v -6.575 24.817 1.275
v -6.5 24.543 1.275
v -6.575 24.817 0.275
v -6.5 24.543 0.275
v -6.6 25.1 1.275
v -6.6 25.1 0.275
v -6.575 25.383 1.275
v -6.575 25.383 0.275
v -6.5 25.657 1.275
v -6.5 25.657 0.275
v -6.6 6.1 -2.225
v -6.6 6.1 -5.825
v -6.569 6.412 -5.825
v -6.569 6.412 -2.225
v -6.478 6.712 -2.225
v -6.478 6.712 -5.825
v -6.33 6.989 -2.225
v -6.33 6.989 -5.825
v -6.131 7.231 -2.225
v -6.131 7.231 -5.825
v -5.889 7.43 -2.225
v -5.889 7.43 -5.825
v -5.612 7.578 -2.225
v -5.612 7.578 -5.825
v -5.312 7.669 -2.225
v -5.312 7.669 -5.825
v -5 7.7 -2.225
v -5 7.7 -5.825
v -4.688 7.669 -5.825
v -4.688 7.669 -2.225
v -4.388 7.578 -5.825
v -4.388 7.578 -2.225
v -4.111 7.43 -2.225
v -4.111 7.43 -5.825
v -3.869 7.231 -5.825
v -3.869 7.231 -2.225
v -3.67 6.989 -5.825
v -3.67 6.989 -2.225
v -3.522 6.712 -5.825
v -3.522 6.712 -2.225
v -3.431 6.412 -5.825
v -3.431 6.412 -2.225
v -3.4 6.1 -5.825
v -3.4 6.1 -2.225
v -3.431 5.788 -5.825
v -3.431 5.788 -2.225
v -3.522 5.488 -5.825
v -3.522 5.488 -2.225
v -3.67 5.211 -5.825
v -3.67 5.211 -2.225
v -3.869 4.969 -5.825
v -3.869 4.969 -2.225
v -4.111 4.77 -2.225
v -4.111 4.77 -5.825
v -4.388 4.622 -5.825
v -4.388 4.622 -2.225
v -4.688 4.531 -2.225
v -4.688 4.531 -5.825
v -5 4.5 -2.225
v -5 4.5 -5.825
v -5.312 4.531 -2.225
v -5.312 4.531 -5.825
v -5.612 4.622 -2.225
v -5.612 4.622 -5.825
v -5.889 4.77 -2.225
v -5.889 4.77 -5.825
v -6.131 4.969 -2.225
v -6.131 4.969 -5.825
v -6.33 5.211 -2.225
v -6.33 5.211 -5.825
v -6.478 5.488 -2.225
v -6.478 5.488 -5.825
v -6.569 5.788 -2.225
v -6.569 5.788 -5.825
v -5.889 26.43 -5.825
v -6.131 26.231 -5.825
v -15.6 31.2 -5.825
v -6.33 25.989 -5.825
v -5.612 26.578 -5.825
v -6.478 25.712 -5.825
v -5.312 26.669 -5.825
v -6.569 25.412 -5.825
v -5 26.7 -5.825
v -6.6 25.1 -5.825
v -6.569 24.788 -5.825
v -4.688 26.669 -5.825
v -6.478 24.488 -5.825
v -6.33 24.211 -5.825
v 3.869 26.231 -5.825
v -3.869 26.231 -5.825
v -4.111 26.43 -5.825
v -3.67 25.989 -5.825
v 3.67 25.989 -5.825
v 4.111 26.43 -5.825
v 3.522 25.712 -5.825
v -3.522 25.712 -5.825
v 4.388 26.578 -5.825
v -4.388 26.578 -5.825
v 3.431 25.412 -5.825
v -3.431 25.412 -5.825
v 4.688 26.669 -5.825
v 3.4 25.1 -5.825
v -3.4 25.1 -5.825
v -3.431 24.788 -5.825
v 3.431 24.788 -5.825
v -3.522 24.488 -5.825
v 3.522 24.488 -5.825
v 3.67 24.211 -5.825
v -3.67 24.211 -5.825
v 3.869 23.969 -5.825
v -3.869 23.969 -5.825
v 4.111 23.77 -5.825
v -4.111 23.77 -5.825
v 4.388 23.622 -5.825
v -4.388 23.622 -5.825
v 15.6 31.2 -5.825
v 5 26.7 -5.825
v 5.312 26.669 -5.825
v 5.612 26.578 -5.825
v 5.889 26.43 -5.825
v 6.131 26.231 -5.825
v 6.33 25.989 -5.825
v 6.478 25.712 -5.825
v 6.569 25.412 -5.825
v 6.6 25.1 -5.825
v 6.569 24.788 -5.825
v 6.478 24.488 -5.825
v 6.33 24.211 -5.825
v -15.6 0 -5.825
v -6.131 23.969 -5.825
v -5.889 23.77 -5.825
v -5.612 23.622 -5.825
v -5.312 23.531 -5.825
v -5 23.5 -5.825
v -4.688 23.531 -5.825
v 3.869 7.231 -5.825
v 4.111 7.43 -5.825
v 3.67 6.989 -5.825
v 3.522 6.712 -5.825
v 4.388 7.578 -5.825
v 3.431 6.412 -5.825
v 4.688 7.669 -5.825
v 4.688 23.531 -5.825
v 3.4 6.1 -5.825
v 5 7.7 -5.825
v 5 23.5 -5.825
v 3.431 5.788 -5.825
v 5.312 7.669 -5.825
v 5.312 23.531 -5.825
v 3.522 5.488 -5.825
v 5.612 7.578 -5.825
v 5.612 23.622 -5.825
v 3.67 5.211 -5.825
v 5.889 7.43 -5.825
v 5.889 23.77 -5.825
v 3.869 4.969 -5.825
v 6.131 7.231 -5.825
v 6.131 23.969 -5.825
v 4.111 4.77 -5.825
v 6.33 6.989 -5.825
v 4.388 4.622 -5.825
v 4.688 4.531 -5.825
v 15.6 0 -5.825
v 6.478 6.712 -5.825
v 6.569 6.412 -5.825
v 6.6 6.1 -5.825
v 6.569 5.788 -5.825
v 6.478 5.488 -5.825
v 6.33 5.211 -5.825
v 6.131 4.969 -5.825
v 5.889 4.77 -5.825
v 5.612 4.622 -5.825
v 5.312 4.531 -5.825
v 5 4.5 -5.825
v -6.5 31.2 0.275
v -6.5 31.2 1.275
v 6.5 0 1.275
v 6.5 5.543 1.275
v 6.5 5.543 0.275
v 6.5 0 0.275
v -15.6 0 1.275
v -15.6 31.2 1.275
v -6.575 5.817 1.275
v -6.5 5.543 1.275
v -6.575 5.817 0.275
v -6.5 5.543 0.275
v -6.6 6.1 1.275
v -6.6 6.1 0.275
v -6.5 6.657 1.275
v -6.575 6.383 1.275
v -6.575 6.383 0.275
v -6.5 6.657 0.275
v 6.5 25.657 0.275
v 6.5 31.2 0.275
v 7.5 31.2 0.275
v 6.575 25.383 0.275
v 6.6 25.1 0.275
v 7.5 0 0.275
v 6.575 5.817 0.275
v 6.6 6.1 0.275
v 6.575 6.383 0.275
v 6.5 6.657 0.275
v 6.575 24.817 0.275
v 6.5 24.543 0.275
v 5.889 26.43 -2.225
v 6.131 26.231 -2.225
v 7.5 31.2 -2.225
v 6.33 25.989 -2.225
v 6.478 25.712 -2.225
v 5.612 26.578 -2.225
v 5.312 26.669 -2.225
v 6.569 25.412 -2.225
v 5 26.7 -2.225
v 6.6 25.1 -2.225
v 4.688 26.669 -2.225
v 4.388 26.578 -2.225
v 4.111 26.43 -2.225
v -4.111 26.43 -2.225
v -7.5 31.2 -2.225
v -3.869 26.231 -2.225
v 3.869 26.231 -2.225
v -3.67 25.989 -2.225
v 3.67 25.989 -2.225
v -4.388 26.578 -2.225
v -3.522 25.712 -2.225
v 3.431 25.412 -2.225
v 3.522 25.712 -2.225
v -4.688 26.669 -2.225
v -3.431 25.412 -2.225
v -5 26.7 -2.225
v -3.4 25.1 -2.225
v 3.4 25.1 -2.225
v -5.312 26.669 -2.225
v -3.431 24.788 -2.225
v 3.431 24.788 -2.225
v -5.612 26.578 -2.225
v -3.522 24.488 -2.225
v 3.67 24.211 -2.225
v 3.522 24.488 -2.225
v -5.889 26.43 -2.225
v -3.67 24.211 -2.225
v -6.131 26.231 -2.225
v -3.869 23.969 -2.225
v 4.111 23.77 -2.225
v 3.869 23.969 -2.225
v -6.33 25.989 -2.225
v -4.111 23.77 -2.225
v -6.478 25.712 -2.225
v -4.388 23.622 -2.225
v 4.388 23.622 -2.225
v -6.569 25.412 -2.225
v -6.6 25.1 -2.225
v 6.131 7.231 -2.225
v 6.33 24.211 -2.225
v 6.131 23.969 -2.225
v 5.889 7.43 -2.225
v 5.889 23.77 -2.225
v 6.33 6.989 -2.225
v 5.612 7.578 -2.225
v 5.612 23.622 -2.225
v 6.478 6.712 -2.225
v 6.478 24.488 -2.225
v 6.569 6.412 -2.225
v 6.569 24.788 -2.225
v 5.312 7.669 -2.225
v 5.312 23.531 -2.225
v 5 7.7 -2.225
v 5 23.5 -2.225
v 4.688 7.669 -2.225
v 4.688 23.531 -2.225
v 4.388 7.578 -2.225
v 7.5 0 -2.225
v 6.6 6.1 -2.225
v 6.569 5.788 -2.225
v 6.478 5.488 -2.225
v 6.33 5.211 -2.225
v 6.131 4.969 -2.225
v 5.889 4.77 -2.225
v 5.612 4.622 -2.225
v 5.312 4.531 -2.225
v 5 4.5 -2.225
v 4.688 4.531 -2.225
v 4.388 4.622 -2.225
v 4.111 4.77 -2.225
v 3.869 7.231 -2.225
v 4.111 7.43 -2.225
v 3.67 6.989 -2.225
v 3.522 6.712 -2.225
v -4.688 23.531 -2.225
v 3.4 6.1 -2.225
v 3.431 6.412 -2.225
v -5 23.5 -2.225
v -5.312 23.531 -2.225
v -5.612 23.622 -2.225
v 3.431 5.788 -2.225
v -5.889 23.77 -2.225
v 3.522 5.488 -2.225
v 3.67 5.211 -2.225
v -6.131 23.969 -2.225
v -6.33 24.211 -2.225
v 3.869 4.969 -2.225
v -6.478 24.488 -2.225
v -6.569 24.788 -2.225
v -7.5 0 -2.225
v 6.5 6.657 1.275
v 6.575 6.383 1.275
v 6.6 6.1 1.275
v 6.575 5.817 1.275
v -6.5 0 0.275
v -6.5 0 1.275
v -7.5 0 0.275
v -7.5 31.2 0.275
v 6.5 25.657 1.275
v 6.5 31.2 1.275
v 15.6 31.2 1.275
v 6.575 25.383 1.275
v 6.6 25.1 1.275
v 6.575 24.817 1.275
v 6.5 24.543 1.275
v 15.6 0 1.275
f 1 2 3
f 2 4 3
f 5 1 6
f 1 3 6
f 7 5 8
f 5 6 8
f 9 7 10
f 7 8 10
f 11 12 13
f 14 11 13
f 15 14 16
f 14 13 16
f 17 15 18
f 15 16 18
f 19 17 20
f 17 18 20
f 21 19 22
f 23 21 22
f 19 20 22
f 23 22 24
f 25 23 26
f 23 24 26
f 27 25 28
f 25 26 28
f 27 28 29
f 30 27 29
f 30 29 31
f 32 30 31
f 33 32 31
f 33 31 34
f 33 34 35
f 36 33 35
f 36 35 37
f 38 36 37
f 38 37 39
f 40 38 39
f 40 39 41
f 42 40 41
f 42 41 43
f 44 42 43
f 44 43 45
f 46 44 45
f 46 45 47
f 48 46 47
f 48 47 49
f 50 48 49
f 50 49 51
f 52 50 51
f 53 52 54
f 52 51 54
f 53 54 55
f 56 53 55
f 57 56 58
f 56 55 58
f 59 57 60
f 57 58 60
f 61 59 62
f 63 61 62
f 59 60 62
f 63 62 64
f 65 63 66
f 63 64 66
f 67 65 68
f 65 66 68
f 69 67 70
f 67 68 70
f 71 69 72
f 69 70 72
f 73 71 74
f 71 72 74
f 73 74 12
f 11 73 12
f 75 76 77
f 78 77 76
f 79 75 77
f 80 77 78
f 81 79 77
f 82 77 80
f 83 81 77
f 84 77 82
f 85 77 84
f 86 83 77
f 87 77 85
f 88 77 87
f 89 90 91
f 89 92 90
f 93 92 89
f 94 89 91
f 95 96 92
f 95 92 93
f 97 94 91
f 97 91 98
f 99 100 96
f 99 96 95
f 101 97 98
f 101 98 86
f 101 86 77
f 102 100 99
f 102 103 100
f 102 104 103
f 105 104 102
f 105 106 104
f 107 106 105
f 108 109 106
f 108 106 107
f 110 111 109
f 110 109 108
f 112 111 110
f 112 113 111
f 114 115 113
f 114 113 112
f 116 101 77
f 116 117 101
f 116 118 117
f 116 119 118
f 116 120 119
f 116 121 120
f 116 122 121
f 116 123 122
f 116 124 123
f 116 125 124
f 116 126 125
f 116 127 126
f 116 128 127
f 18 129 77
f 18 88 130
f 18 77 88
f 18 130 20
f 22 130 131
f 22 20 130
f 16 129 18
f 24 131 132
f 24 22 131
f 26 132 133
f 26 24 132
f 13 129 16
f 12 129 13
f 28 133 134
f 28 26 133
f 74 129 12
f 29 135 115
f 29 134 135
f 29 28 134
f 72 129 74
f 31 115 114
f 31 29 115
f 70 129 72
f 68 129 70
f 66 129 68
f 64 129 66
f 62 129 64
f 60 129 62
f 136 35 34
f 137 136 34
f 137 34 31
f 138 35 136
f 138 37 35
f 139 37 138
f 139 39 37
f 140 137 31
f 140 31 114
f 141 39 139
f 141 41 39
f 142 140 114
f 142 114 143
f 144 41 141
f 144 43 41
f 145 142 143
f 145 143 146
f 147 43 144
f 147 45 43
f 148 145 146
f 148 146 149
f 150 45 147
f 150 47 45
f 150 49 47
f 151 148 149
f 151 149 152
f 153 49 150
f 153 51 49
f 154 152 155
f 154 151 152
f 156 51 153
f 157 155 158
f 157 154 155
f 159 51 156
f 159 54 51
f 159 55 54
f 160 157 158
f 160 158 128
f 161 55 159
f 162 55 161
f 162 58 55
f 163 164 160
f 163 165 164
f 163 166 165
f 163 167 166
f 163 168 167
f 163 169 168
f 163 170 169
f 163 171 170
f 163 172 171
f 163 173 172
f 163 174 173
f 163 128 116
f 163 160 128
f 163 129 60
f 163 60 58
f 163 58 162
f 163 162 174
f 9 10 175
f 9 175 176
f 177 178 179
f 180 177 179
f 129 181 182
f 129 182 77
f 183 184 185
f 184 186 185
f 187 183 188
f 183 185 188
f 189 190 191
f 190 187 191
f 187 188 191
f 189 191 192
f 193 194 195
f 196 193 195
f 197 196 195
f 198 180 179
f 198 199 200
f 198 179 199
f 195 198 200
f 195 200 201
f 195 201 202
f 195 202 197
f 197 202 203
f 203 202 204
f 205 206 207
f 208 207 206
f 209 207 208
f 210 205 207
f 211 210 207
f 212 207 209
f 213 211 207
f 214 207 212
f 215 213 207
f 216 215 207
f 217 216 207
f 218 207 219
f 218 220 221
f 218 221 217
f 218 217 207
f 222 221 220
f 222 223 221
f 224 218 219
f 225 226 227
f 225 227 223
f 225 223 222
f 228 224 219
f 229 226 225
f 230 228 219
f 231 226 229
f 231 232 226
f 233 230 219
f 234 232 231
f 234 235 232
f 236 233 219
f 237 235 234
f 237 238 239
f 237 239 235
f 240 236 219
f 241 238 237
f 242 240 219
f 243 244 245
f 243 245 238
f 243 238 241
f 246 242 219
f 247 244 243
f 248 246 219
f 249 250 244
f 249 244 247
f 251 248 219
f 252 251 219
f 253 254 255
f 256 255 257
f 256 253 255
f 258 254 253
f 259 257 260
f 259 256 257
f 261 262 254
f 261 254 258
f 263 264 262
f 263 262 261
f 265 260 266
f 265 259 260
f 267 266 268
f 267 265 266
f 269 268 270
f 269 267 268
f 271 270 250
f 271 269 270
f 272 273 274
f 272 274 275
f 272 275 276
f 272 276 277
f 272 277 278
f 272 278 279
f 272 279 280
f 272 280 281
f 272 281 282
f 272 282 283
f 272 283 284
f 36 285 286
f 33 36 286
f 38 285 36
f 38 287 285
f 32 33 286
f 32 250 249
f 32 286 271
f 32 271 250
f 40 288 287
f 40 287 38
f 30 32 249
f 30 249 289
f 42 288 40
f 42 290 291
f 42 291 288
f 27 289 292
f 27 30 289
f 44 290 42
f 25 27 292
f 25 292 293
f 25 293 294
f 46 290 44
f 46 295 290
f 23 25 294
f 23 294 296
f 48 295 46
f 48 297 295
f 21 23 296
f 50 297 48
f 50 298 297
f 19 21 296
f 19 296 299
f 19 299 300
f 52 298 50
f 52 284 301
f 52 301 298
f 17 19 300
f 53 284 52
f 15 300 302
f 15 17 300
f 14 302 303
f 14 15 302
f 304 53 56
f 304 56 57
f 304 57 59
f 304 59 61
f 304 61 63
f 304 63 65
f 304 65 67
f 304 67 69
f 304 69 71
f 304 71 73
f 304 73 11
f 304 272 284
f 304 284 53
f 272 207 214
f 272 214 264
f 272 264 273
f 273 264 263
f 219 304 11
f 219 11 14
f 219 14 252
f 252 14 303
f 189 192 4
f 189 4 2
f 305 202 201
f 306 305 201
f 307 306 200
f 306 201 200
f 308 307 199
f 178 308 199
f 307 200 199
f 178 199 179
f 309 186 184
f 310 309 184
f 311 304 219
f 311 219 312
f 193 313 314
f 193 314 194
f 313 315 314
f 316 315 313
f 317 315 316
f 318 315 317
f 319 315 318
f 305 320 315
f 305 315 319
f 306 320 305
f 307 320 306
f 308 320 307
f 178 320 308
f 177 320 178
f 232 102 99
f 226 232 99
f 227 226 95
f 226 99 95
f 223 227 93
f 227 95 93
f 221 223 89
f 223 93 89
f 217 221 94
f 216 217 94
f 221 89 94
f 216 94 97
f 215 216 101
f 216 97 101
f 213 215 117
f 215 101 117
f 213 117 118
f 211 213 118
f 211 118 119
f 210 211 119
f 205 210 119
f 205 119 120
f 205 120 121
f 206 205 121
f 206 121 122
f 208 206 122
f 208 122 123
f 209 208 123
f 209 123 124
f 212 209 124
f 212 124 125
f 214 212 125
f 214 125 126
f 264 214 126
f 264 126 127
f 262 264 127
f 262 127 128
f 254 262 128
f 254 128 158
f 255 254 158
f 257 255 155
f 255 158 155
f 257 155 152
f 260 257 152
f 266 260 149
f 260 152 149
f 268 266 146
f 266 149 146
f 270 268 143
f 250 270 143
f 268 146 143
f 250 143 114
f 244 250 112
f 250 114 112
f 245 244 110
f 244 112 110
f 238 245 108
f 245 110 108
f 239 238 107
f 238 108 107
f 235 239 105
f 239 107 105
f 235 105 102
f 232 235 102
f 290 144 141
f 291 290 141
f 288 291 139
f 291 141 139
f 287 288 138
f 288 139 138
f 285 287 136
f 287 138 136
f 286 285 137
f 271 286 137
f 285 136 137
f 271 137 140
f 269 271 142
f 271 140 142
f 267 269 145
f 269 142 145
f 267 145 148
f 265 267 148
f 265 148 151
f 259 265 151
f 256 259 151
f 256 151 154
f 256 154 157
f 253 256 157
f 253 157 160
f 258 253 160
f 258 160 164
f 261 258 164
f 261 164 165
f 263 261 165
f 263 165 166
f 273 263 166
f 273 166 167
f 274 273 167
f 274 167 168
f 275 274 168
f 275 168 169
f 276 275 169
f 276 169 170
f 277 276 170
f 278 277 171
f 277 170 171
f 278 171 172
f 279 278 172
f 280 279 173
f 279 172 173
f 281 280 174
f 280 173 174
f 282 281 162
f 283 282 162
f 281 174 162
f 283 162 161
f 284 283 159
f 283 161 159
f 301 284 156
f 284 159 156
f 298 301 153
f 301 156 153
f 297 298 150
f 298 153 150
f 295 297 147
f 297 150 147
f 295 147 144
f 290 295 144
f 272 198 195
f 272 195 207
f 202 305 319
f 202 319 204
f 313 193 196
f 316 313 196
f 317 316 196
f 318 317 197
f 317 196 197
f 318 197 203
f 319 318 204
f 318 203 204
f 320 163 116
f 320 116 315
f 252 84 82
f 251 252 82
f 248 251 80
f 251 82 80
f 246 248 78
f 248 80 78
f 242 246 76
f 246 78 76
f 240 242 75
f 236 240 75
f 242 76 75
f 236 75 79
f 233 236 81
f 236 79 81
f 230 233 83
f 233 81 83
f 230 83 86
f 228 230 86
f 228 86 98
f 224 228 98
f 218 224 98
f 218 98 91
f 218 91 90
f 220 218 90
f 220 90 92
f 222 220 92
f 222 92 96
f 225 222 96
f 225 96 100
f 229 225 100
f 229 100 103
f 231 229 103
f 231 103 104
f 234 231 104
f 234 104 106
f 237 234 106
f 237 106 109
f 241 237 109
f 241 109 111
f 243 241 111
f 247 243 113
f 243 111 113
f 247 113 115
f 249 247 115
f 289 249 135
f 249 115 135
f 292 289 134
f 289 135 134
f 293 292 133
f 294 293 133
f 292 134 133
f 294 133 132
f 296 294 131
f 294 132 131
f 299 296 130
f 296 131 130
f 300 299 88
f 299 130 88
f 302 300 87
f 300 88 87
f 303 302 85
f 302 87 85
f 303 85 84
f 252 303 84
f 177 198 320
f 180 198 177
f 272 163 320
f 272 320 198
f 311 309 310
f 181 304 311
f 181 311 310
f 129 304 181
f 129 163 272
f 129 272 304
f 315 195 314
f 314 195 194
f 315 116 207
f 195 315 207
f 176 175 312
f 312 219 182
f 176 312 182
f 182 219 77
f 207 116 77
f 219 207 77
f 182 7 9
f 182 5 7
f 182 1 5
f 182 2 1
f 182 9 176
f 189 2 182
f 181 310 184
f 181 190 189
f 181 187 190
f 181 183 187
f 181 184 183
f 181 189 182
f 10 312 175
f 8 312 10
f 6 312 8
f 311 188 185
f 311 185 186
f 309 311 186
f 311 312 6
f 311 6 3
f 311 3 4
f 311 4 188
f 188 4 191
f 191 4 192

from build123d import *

# Parameters (mm, degrees)
EXTRUDE_1_DEPTH     = 31.2
SKETCH_2_R          = 1.6
CUT_EXTRUDE_1_DEPTH = 10


with BuildPart() as part:
    # 草图1 → 凸台-拉伸1 (new body)
    with BuildSketch(Plane(origin=(0, 0, 0), x_dir=(1, 0, 0), z_dir=(0, 1, 0))):
        Polygon((-7.5, -0.275116875), (-6.5, -0.275116875), (-6.5, -1.275116875), (-15.6, -1.275116875), (-15.6, 5.824883125), (15.6, 5.824883125), (15.6, -1.275116875), (6.5, -1.275116875), (6.5, -0.275116875), (7.5, -0.275116875), (7.5, 2.224883125), (-7.5, 2.224883125), align=None)
    extrude(amount=EXTRUDE_1_DEPTH)

    # 草图2 → 切除-拉伸1 (cut)
    with BuildSketch(Plane(origin=(0, 0, -5.824883125), x_dir=(-1, 0, 0), z_dir=(0, 0, -1))):
        with Locations((-5, 25.1)):
            Circle(SKETCH_2_R)
        with Locations((5, 25.1)):
            Circle(SKETCH_2_R)
        with Locations((5, 6.1)):
            Circle(SKETCH_2_R)
        with Locations((-5, 6.1)):
            Circle(SKETCH_2_R)
    extrude(amount=-CUT_EXTRUDE_1_DEPTH, mode=Mode.SUBTRACT)


solid = part.part
